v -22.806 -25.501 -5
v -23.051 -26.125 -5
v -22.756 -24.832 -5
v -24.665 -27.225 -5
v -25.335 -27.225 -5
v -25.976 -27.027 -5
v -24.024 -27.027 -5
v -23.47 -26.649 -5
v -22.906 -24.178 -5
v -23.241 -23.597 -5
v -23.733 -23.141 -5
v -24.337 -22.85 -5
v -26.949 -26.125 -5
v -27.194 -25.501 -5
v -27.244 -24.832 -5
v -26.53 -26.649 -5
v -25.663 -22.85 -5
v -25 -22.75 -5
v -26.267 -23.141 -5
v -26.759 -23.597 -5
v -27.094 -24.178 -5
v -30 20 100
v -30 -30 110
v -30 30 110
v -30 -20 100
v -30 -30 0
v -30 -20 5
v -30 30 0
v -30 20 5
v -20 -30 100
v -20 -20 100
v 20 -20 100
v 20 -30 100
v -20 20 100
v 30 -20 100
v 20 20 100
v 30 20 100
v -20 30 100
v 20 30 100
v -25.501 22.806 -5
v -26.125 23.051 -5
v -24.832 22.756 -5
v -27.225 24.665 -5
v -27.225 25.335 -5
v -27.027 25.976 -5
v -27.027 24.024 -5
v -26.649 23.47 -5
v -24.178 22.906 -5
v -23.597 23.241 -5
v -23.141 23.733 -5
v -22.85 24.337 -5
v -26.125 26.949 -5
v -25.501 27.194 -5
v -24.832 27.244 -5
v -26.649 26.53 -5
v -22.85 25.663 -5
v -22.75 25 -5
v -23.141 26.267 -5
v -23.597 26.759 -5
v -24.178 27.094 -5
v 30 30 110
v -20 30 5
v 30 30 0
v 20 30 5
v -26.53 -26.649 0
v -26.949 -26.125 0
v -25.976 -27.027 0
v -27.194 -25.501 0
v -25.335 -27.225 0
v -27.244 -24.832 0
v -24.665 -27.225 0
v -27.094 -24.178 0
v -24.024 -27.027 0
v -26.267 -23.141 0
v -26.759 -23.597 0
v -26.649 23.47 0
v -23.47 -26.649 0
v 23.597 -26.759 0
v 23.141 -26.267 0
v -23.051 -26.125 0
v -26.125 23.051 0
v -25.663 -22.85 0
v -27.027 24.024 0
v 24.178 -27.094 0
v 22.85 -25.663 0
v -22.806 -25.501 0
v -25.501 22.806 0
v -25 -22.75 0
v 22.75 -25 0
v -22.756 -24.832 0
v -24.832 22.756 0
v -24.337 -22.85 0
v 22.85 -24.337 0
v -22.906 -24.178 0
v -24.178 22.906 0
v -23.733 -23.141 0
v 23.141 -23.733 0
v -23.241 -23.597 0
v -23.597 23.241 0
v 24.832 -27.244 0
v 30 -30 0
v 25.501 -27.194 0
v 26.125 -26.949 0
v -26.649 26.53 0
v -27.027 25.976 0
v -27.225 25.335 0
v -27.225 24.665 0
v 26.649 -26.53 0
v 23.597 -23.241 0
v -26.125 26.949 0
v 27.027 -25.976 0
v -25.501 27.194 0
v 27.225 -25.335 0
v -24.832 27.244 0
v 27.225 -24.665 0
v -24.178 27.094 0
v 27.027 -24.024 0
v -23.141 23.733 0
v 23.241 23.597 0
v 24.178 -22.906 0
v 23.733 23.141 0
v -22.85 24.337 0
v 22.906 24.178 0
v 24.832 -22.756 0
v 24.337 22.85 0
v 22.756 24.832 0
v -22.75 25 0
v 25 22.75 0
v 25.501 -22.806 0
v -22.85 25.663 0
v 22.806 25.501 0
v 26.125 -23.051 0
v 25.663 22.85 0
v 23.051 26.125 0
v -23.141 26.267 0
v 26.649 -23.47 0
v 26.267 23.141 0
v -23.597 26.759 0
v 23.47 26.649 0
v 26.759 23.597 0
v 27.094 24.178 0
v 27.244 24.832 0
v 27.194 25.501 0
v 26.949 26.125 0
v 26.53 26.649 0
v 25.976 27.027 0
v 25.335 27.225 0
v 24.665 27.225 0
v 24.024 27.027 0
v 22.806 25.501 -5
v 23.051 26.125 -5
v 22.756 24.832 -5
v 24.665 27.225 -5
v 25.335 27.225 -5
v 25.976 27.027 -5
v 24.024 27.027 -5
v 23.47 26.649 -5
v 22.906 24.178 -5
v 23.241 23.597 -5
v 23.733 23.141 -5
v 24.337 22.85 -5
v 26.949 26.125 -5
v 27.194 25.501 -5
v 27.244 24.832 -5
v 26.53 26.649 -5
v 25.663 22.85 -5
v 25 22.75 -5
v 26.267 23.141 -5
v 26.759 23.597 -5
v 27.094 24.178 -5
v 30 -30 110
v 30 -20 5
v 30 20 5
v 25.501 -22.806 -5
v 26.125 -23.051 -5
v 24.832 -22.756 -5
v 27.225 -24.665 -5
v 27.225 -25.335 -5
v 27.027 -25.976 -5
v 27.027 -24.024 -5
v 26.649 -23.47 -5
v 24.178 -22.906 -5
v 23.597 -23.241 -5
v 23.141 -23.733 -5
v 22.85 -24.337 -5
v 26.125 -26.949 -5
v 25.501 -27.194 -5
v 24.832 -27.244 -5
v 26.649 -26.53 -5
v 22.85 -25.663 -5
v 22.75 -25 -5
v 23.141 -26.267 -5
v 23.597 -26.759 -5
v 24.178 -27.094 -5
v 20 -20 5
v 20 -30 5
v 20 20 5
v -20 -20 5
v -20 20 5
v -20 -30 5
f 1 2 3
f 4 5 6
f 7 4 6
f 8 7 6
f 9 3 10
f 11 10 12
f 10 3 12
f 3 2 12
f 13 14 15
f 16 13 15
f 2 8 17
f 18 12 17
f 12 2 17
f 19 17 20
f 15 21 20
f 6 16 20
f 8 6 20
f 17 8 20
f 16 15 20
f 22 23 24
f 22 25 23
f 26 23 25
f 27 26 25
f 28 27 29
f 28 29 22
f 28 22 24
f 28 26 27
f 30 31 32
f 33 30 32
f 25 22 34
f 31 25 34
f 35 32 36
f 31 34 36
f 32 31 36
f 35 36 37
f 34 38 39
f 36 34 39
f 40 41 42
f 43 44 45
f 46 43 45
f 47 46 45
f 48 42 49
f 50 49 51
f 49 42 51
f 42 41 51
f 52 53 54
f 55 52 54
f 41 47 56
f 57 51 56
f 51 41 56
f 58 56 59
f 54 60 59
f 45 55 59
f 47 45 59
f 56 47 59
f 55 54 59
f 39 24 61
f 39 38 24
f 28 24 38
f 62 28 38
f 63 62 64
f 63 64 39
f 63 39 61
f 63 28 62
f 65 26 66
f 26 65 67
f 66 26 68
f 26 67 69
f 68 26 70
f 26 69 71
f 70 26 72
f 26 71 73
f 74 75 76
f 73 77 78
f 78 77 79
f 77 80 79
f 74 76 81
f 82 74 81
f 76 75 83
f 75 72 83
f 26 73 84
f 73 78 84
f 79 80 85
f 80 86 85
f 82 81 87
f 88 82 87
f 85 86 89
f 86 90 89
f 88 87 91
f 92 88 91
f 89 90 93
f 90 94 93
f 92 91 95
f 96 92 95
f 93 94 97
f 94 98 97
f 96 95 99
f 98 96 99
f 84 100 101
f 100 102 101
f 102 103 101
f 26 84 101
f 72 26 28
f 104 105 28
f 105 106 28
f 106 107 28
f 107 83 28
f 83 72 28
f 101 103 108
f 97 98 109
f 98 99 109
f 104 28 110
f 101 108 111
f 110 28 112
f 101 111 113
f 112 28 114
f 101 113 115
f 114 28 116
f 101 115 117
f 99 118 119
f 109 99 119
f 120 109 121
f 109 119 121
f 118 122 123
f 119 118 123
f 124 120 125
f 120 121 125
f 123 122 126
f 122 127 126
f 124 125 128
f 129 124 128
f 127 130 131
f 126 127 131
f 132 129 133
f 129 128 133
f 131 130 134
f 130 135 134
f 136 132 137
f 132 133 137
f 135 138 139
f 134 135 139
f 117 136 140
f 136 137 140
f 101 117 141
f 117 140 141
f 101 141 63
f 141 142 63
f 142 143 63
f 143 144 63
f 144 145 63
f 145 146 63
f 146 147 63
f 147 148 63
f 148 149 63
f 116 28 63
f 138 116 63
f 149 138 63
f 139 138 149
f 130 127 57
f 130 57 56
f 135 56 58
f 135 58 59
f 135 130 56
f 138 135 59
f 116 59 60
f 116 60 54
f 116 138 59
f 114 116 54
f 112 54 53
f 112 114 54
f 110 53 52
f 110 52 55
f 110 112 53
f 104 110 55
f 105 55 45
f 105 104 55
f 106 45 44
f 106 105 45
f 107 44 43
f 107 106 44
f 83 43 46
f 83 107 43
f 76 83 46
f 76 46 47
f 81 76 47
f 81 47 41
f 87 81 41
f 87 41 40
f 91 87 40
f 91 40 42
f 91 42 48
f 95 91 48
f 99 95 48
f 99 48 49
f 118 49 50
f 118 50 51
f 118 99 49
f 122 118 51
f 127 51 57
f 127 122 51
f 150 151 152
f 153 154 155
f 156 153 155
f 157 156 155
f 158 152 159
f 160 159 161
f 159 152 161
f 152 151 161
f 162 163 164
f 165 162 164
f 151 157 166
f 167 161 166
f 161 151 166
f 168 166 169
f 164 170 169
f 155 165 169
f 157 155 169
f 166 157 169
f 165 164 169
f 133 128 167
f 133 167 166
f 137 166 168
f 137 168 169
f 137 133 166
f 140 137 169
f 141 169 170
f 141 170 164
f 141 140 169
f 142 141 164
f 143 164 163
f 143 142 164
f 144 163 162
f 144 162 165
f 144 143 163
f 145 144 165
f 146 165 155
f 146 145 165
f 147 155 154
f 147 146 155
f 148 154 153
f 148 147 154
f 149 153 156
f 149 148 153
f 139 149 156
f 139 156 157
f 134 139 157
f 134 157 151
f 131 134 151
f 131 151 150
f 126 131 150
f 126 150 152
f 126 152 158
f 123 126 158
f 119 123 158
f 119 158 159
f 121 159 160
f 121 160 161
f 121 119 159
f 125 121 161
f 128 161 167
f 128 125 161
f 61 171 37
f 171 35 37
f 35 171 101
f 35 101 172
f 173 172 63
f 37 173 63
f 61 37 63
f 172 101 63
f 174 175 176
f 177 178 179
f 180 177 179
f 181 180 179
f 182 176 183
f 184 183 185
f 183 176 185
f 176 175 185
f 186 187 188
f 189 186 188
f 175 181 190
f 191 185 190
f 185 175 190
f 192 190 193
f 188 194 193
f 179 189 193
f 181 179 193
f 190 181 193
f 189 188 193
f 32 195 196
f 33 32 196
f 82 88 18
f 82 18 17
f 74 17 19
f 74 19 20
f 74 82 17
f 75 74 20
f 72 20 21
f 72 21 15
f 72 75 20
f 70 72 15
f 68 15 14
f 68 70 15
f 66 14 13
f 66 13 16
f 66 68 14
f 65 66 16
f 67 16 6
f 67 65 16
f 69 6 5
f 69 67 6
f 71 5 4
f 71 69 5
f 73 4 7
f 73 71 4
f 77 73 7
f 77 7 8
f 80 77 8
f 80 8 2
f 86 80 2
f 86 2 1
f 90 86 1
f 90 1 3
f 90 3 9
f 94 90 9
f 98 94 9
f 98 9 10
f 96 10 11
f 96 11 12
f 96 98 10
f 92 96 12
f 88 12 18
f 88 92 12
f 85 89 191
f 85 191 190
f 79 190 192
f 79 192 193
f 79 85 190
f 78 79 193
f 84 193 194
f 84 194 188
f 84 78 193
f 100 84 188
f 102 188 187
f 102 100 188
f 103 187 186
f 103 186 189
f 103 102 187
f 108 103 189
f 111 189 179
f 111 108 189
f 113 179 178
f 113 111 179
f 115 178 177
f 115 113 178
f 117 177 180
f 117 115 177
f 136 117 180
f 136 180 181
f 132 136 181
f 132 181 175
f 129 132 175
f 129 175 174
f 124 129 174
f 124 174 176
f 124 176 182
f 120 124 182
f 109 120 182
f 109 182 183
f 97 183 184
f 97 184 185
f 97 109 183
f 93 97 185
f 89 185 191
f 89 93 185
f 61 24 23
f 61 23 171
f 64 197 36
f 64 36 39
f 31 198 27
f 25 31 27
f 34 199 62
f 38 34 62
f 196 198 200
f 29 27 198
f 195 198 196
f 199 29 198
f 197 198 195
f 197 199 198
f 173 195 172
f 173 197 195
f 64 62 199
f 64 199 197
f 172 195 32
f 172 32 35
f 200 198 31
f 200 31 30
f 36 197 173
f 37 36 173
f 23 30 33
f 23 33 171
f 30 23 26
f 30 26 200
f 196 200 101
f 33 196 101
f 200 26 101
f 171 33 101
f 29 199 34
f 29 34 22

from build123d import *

# Parameters (mm, degrees)
SKETCH_W              = 60
SKETCH_H              = 60
PAD_DEPTH             = 5
SKETCH001_R           = 2.25
PAD001_DEPTH          = 5
POLARPATTERN_COUNT    = 4
SKETCH002_W           = 10
SKETCH002_H           = 10
PAD002_DEPTH          = 100
POLARPATTERN001_COUNT = 4
SKETCH003_W           = 60
SKETCH003_H           = 60
PAD003_DEPTH          = 10


with BuildPart() as part:
    # Sketch → Pad (new body)
    with BuildSketch(Plane.XY):
        Rectangle(SKETCH_W, SKETCH_H)
    extrude(amount=PAD_DEPTH)

    # Sketch001 → Pad001 (join)
    with BuildSketch(Plane.XY):
        with Locations((-25, 25)):
            Circle(SKETCH001_R)
    pad001 = extrude(amount=-PAD001_DEPTH)

    # PolarPattern: Pad001 ×4 about axis
    polarpattern_axis = Axis((0, 0, 0), (0, 0, 1))
    for i in range(1, POLARPATTERN_COUNT):
        add(pad001.rotate(polarpattern_axis, i * 360 / POLARPATTERN_COUNT))

    # Sketch002 → Pad002 (join)
    with BuildSketch(Plane.XY):
        with Locations((25, 25)):
            Rectangle(SKETCH002_W, SKETCH002_H)
    pad002 = extrude(amount=PAD002_DEPTH)

    # PolarPattern001: Pad002 ×4 about axis
    polarpattern001_axis = Axis((0, 0, 0), (0, 0, 1))
    for i in range(1, POLARPATTERN001_COUNT):
        add(pad002.rotate(polarpattern001_axis, i * 360 / POLARPATTERN001_COUNT))

    # Sketch003 → Pad003 (join)
    with BuildSketch(Plane.XY.offset(100)):
        Rectangle(SKETCH003_W, SKETCH003_H)
    extrude(amount=PAD003_DEPTH)


solid = part.part
